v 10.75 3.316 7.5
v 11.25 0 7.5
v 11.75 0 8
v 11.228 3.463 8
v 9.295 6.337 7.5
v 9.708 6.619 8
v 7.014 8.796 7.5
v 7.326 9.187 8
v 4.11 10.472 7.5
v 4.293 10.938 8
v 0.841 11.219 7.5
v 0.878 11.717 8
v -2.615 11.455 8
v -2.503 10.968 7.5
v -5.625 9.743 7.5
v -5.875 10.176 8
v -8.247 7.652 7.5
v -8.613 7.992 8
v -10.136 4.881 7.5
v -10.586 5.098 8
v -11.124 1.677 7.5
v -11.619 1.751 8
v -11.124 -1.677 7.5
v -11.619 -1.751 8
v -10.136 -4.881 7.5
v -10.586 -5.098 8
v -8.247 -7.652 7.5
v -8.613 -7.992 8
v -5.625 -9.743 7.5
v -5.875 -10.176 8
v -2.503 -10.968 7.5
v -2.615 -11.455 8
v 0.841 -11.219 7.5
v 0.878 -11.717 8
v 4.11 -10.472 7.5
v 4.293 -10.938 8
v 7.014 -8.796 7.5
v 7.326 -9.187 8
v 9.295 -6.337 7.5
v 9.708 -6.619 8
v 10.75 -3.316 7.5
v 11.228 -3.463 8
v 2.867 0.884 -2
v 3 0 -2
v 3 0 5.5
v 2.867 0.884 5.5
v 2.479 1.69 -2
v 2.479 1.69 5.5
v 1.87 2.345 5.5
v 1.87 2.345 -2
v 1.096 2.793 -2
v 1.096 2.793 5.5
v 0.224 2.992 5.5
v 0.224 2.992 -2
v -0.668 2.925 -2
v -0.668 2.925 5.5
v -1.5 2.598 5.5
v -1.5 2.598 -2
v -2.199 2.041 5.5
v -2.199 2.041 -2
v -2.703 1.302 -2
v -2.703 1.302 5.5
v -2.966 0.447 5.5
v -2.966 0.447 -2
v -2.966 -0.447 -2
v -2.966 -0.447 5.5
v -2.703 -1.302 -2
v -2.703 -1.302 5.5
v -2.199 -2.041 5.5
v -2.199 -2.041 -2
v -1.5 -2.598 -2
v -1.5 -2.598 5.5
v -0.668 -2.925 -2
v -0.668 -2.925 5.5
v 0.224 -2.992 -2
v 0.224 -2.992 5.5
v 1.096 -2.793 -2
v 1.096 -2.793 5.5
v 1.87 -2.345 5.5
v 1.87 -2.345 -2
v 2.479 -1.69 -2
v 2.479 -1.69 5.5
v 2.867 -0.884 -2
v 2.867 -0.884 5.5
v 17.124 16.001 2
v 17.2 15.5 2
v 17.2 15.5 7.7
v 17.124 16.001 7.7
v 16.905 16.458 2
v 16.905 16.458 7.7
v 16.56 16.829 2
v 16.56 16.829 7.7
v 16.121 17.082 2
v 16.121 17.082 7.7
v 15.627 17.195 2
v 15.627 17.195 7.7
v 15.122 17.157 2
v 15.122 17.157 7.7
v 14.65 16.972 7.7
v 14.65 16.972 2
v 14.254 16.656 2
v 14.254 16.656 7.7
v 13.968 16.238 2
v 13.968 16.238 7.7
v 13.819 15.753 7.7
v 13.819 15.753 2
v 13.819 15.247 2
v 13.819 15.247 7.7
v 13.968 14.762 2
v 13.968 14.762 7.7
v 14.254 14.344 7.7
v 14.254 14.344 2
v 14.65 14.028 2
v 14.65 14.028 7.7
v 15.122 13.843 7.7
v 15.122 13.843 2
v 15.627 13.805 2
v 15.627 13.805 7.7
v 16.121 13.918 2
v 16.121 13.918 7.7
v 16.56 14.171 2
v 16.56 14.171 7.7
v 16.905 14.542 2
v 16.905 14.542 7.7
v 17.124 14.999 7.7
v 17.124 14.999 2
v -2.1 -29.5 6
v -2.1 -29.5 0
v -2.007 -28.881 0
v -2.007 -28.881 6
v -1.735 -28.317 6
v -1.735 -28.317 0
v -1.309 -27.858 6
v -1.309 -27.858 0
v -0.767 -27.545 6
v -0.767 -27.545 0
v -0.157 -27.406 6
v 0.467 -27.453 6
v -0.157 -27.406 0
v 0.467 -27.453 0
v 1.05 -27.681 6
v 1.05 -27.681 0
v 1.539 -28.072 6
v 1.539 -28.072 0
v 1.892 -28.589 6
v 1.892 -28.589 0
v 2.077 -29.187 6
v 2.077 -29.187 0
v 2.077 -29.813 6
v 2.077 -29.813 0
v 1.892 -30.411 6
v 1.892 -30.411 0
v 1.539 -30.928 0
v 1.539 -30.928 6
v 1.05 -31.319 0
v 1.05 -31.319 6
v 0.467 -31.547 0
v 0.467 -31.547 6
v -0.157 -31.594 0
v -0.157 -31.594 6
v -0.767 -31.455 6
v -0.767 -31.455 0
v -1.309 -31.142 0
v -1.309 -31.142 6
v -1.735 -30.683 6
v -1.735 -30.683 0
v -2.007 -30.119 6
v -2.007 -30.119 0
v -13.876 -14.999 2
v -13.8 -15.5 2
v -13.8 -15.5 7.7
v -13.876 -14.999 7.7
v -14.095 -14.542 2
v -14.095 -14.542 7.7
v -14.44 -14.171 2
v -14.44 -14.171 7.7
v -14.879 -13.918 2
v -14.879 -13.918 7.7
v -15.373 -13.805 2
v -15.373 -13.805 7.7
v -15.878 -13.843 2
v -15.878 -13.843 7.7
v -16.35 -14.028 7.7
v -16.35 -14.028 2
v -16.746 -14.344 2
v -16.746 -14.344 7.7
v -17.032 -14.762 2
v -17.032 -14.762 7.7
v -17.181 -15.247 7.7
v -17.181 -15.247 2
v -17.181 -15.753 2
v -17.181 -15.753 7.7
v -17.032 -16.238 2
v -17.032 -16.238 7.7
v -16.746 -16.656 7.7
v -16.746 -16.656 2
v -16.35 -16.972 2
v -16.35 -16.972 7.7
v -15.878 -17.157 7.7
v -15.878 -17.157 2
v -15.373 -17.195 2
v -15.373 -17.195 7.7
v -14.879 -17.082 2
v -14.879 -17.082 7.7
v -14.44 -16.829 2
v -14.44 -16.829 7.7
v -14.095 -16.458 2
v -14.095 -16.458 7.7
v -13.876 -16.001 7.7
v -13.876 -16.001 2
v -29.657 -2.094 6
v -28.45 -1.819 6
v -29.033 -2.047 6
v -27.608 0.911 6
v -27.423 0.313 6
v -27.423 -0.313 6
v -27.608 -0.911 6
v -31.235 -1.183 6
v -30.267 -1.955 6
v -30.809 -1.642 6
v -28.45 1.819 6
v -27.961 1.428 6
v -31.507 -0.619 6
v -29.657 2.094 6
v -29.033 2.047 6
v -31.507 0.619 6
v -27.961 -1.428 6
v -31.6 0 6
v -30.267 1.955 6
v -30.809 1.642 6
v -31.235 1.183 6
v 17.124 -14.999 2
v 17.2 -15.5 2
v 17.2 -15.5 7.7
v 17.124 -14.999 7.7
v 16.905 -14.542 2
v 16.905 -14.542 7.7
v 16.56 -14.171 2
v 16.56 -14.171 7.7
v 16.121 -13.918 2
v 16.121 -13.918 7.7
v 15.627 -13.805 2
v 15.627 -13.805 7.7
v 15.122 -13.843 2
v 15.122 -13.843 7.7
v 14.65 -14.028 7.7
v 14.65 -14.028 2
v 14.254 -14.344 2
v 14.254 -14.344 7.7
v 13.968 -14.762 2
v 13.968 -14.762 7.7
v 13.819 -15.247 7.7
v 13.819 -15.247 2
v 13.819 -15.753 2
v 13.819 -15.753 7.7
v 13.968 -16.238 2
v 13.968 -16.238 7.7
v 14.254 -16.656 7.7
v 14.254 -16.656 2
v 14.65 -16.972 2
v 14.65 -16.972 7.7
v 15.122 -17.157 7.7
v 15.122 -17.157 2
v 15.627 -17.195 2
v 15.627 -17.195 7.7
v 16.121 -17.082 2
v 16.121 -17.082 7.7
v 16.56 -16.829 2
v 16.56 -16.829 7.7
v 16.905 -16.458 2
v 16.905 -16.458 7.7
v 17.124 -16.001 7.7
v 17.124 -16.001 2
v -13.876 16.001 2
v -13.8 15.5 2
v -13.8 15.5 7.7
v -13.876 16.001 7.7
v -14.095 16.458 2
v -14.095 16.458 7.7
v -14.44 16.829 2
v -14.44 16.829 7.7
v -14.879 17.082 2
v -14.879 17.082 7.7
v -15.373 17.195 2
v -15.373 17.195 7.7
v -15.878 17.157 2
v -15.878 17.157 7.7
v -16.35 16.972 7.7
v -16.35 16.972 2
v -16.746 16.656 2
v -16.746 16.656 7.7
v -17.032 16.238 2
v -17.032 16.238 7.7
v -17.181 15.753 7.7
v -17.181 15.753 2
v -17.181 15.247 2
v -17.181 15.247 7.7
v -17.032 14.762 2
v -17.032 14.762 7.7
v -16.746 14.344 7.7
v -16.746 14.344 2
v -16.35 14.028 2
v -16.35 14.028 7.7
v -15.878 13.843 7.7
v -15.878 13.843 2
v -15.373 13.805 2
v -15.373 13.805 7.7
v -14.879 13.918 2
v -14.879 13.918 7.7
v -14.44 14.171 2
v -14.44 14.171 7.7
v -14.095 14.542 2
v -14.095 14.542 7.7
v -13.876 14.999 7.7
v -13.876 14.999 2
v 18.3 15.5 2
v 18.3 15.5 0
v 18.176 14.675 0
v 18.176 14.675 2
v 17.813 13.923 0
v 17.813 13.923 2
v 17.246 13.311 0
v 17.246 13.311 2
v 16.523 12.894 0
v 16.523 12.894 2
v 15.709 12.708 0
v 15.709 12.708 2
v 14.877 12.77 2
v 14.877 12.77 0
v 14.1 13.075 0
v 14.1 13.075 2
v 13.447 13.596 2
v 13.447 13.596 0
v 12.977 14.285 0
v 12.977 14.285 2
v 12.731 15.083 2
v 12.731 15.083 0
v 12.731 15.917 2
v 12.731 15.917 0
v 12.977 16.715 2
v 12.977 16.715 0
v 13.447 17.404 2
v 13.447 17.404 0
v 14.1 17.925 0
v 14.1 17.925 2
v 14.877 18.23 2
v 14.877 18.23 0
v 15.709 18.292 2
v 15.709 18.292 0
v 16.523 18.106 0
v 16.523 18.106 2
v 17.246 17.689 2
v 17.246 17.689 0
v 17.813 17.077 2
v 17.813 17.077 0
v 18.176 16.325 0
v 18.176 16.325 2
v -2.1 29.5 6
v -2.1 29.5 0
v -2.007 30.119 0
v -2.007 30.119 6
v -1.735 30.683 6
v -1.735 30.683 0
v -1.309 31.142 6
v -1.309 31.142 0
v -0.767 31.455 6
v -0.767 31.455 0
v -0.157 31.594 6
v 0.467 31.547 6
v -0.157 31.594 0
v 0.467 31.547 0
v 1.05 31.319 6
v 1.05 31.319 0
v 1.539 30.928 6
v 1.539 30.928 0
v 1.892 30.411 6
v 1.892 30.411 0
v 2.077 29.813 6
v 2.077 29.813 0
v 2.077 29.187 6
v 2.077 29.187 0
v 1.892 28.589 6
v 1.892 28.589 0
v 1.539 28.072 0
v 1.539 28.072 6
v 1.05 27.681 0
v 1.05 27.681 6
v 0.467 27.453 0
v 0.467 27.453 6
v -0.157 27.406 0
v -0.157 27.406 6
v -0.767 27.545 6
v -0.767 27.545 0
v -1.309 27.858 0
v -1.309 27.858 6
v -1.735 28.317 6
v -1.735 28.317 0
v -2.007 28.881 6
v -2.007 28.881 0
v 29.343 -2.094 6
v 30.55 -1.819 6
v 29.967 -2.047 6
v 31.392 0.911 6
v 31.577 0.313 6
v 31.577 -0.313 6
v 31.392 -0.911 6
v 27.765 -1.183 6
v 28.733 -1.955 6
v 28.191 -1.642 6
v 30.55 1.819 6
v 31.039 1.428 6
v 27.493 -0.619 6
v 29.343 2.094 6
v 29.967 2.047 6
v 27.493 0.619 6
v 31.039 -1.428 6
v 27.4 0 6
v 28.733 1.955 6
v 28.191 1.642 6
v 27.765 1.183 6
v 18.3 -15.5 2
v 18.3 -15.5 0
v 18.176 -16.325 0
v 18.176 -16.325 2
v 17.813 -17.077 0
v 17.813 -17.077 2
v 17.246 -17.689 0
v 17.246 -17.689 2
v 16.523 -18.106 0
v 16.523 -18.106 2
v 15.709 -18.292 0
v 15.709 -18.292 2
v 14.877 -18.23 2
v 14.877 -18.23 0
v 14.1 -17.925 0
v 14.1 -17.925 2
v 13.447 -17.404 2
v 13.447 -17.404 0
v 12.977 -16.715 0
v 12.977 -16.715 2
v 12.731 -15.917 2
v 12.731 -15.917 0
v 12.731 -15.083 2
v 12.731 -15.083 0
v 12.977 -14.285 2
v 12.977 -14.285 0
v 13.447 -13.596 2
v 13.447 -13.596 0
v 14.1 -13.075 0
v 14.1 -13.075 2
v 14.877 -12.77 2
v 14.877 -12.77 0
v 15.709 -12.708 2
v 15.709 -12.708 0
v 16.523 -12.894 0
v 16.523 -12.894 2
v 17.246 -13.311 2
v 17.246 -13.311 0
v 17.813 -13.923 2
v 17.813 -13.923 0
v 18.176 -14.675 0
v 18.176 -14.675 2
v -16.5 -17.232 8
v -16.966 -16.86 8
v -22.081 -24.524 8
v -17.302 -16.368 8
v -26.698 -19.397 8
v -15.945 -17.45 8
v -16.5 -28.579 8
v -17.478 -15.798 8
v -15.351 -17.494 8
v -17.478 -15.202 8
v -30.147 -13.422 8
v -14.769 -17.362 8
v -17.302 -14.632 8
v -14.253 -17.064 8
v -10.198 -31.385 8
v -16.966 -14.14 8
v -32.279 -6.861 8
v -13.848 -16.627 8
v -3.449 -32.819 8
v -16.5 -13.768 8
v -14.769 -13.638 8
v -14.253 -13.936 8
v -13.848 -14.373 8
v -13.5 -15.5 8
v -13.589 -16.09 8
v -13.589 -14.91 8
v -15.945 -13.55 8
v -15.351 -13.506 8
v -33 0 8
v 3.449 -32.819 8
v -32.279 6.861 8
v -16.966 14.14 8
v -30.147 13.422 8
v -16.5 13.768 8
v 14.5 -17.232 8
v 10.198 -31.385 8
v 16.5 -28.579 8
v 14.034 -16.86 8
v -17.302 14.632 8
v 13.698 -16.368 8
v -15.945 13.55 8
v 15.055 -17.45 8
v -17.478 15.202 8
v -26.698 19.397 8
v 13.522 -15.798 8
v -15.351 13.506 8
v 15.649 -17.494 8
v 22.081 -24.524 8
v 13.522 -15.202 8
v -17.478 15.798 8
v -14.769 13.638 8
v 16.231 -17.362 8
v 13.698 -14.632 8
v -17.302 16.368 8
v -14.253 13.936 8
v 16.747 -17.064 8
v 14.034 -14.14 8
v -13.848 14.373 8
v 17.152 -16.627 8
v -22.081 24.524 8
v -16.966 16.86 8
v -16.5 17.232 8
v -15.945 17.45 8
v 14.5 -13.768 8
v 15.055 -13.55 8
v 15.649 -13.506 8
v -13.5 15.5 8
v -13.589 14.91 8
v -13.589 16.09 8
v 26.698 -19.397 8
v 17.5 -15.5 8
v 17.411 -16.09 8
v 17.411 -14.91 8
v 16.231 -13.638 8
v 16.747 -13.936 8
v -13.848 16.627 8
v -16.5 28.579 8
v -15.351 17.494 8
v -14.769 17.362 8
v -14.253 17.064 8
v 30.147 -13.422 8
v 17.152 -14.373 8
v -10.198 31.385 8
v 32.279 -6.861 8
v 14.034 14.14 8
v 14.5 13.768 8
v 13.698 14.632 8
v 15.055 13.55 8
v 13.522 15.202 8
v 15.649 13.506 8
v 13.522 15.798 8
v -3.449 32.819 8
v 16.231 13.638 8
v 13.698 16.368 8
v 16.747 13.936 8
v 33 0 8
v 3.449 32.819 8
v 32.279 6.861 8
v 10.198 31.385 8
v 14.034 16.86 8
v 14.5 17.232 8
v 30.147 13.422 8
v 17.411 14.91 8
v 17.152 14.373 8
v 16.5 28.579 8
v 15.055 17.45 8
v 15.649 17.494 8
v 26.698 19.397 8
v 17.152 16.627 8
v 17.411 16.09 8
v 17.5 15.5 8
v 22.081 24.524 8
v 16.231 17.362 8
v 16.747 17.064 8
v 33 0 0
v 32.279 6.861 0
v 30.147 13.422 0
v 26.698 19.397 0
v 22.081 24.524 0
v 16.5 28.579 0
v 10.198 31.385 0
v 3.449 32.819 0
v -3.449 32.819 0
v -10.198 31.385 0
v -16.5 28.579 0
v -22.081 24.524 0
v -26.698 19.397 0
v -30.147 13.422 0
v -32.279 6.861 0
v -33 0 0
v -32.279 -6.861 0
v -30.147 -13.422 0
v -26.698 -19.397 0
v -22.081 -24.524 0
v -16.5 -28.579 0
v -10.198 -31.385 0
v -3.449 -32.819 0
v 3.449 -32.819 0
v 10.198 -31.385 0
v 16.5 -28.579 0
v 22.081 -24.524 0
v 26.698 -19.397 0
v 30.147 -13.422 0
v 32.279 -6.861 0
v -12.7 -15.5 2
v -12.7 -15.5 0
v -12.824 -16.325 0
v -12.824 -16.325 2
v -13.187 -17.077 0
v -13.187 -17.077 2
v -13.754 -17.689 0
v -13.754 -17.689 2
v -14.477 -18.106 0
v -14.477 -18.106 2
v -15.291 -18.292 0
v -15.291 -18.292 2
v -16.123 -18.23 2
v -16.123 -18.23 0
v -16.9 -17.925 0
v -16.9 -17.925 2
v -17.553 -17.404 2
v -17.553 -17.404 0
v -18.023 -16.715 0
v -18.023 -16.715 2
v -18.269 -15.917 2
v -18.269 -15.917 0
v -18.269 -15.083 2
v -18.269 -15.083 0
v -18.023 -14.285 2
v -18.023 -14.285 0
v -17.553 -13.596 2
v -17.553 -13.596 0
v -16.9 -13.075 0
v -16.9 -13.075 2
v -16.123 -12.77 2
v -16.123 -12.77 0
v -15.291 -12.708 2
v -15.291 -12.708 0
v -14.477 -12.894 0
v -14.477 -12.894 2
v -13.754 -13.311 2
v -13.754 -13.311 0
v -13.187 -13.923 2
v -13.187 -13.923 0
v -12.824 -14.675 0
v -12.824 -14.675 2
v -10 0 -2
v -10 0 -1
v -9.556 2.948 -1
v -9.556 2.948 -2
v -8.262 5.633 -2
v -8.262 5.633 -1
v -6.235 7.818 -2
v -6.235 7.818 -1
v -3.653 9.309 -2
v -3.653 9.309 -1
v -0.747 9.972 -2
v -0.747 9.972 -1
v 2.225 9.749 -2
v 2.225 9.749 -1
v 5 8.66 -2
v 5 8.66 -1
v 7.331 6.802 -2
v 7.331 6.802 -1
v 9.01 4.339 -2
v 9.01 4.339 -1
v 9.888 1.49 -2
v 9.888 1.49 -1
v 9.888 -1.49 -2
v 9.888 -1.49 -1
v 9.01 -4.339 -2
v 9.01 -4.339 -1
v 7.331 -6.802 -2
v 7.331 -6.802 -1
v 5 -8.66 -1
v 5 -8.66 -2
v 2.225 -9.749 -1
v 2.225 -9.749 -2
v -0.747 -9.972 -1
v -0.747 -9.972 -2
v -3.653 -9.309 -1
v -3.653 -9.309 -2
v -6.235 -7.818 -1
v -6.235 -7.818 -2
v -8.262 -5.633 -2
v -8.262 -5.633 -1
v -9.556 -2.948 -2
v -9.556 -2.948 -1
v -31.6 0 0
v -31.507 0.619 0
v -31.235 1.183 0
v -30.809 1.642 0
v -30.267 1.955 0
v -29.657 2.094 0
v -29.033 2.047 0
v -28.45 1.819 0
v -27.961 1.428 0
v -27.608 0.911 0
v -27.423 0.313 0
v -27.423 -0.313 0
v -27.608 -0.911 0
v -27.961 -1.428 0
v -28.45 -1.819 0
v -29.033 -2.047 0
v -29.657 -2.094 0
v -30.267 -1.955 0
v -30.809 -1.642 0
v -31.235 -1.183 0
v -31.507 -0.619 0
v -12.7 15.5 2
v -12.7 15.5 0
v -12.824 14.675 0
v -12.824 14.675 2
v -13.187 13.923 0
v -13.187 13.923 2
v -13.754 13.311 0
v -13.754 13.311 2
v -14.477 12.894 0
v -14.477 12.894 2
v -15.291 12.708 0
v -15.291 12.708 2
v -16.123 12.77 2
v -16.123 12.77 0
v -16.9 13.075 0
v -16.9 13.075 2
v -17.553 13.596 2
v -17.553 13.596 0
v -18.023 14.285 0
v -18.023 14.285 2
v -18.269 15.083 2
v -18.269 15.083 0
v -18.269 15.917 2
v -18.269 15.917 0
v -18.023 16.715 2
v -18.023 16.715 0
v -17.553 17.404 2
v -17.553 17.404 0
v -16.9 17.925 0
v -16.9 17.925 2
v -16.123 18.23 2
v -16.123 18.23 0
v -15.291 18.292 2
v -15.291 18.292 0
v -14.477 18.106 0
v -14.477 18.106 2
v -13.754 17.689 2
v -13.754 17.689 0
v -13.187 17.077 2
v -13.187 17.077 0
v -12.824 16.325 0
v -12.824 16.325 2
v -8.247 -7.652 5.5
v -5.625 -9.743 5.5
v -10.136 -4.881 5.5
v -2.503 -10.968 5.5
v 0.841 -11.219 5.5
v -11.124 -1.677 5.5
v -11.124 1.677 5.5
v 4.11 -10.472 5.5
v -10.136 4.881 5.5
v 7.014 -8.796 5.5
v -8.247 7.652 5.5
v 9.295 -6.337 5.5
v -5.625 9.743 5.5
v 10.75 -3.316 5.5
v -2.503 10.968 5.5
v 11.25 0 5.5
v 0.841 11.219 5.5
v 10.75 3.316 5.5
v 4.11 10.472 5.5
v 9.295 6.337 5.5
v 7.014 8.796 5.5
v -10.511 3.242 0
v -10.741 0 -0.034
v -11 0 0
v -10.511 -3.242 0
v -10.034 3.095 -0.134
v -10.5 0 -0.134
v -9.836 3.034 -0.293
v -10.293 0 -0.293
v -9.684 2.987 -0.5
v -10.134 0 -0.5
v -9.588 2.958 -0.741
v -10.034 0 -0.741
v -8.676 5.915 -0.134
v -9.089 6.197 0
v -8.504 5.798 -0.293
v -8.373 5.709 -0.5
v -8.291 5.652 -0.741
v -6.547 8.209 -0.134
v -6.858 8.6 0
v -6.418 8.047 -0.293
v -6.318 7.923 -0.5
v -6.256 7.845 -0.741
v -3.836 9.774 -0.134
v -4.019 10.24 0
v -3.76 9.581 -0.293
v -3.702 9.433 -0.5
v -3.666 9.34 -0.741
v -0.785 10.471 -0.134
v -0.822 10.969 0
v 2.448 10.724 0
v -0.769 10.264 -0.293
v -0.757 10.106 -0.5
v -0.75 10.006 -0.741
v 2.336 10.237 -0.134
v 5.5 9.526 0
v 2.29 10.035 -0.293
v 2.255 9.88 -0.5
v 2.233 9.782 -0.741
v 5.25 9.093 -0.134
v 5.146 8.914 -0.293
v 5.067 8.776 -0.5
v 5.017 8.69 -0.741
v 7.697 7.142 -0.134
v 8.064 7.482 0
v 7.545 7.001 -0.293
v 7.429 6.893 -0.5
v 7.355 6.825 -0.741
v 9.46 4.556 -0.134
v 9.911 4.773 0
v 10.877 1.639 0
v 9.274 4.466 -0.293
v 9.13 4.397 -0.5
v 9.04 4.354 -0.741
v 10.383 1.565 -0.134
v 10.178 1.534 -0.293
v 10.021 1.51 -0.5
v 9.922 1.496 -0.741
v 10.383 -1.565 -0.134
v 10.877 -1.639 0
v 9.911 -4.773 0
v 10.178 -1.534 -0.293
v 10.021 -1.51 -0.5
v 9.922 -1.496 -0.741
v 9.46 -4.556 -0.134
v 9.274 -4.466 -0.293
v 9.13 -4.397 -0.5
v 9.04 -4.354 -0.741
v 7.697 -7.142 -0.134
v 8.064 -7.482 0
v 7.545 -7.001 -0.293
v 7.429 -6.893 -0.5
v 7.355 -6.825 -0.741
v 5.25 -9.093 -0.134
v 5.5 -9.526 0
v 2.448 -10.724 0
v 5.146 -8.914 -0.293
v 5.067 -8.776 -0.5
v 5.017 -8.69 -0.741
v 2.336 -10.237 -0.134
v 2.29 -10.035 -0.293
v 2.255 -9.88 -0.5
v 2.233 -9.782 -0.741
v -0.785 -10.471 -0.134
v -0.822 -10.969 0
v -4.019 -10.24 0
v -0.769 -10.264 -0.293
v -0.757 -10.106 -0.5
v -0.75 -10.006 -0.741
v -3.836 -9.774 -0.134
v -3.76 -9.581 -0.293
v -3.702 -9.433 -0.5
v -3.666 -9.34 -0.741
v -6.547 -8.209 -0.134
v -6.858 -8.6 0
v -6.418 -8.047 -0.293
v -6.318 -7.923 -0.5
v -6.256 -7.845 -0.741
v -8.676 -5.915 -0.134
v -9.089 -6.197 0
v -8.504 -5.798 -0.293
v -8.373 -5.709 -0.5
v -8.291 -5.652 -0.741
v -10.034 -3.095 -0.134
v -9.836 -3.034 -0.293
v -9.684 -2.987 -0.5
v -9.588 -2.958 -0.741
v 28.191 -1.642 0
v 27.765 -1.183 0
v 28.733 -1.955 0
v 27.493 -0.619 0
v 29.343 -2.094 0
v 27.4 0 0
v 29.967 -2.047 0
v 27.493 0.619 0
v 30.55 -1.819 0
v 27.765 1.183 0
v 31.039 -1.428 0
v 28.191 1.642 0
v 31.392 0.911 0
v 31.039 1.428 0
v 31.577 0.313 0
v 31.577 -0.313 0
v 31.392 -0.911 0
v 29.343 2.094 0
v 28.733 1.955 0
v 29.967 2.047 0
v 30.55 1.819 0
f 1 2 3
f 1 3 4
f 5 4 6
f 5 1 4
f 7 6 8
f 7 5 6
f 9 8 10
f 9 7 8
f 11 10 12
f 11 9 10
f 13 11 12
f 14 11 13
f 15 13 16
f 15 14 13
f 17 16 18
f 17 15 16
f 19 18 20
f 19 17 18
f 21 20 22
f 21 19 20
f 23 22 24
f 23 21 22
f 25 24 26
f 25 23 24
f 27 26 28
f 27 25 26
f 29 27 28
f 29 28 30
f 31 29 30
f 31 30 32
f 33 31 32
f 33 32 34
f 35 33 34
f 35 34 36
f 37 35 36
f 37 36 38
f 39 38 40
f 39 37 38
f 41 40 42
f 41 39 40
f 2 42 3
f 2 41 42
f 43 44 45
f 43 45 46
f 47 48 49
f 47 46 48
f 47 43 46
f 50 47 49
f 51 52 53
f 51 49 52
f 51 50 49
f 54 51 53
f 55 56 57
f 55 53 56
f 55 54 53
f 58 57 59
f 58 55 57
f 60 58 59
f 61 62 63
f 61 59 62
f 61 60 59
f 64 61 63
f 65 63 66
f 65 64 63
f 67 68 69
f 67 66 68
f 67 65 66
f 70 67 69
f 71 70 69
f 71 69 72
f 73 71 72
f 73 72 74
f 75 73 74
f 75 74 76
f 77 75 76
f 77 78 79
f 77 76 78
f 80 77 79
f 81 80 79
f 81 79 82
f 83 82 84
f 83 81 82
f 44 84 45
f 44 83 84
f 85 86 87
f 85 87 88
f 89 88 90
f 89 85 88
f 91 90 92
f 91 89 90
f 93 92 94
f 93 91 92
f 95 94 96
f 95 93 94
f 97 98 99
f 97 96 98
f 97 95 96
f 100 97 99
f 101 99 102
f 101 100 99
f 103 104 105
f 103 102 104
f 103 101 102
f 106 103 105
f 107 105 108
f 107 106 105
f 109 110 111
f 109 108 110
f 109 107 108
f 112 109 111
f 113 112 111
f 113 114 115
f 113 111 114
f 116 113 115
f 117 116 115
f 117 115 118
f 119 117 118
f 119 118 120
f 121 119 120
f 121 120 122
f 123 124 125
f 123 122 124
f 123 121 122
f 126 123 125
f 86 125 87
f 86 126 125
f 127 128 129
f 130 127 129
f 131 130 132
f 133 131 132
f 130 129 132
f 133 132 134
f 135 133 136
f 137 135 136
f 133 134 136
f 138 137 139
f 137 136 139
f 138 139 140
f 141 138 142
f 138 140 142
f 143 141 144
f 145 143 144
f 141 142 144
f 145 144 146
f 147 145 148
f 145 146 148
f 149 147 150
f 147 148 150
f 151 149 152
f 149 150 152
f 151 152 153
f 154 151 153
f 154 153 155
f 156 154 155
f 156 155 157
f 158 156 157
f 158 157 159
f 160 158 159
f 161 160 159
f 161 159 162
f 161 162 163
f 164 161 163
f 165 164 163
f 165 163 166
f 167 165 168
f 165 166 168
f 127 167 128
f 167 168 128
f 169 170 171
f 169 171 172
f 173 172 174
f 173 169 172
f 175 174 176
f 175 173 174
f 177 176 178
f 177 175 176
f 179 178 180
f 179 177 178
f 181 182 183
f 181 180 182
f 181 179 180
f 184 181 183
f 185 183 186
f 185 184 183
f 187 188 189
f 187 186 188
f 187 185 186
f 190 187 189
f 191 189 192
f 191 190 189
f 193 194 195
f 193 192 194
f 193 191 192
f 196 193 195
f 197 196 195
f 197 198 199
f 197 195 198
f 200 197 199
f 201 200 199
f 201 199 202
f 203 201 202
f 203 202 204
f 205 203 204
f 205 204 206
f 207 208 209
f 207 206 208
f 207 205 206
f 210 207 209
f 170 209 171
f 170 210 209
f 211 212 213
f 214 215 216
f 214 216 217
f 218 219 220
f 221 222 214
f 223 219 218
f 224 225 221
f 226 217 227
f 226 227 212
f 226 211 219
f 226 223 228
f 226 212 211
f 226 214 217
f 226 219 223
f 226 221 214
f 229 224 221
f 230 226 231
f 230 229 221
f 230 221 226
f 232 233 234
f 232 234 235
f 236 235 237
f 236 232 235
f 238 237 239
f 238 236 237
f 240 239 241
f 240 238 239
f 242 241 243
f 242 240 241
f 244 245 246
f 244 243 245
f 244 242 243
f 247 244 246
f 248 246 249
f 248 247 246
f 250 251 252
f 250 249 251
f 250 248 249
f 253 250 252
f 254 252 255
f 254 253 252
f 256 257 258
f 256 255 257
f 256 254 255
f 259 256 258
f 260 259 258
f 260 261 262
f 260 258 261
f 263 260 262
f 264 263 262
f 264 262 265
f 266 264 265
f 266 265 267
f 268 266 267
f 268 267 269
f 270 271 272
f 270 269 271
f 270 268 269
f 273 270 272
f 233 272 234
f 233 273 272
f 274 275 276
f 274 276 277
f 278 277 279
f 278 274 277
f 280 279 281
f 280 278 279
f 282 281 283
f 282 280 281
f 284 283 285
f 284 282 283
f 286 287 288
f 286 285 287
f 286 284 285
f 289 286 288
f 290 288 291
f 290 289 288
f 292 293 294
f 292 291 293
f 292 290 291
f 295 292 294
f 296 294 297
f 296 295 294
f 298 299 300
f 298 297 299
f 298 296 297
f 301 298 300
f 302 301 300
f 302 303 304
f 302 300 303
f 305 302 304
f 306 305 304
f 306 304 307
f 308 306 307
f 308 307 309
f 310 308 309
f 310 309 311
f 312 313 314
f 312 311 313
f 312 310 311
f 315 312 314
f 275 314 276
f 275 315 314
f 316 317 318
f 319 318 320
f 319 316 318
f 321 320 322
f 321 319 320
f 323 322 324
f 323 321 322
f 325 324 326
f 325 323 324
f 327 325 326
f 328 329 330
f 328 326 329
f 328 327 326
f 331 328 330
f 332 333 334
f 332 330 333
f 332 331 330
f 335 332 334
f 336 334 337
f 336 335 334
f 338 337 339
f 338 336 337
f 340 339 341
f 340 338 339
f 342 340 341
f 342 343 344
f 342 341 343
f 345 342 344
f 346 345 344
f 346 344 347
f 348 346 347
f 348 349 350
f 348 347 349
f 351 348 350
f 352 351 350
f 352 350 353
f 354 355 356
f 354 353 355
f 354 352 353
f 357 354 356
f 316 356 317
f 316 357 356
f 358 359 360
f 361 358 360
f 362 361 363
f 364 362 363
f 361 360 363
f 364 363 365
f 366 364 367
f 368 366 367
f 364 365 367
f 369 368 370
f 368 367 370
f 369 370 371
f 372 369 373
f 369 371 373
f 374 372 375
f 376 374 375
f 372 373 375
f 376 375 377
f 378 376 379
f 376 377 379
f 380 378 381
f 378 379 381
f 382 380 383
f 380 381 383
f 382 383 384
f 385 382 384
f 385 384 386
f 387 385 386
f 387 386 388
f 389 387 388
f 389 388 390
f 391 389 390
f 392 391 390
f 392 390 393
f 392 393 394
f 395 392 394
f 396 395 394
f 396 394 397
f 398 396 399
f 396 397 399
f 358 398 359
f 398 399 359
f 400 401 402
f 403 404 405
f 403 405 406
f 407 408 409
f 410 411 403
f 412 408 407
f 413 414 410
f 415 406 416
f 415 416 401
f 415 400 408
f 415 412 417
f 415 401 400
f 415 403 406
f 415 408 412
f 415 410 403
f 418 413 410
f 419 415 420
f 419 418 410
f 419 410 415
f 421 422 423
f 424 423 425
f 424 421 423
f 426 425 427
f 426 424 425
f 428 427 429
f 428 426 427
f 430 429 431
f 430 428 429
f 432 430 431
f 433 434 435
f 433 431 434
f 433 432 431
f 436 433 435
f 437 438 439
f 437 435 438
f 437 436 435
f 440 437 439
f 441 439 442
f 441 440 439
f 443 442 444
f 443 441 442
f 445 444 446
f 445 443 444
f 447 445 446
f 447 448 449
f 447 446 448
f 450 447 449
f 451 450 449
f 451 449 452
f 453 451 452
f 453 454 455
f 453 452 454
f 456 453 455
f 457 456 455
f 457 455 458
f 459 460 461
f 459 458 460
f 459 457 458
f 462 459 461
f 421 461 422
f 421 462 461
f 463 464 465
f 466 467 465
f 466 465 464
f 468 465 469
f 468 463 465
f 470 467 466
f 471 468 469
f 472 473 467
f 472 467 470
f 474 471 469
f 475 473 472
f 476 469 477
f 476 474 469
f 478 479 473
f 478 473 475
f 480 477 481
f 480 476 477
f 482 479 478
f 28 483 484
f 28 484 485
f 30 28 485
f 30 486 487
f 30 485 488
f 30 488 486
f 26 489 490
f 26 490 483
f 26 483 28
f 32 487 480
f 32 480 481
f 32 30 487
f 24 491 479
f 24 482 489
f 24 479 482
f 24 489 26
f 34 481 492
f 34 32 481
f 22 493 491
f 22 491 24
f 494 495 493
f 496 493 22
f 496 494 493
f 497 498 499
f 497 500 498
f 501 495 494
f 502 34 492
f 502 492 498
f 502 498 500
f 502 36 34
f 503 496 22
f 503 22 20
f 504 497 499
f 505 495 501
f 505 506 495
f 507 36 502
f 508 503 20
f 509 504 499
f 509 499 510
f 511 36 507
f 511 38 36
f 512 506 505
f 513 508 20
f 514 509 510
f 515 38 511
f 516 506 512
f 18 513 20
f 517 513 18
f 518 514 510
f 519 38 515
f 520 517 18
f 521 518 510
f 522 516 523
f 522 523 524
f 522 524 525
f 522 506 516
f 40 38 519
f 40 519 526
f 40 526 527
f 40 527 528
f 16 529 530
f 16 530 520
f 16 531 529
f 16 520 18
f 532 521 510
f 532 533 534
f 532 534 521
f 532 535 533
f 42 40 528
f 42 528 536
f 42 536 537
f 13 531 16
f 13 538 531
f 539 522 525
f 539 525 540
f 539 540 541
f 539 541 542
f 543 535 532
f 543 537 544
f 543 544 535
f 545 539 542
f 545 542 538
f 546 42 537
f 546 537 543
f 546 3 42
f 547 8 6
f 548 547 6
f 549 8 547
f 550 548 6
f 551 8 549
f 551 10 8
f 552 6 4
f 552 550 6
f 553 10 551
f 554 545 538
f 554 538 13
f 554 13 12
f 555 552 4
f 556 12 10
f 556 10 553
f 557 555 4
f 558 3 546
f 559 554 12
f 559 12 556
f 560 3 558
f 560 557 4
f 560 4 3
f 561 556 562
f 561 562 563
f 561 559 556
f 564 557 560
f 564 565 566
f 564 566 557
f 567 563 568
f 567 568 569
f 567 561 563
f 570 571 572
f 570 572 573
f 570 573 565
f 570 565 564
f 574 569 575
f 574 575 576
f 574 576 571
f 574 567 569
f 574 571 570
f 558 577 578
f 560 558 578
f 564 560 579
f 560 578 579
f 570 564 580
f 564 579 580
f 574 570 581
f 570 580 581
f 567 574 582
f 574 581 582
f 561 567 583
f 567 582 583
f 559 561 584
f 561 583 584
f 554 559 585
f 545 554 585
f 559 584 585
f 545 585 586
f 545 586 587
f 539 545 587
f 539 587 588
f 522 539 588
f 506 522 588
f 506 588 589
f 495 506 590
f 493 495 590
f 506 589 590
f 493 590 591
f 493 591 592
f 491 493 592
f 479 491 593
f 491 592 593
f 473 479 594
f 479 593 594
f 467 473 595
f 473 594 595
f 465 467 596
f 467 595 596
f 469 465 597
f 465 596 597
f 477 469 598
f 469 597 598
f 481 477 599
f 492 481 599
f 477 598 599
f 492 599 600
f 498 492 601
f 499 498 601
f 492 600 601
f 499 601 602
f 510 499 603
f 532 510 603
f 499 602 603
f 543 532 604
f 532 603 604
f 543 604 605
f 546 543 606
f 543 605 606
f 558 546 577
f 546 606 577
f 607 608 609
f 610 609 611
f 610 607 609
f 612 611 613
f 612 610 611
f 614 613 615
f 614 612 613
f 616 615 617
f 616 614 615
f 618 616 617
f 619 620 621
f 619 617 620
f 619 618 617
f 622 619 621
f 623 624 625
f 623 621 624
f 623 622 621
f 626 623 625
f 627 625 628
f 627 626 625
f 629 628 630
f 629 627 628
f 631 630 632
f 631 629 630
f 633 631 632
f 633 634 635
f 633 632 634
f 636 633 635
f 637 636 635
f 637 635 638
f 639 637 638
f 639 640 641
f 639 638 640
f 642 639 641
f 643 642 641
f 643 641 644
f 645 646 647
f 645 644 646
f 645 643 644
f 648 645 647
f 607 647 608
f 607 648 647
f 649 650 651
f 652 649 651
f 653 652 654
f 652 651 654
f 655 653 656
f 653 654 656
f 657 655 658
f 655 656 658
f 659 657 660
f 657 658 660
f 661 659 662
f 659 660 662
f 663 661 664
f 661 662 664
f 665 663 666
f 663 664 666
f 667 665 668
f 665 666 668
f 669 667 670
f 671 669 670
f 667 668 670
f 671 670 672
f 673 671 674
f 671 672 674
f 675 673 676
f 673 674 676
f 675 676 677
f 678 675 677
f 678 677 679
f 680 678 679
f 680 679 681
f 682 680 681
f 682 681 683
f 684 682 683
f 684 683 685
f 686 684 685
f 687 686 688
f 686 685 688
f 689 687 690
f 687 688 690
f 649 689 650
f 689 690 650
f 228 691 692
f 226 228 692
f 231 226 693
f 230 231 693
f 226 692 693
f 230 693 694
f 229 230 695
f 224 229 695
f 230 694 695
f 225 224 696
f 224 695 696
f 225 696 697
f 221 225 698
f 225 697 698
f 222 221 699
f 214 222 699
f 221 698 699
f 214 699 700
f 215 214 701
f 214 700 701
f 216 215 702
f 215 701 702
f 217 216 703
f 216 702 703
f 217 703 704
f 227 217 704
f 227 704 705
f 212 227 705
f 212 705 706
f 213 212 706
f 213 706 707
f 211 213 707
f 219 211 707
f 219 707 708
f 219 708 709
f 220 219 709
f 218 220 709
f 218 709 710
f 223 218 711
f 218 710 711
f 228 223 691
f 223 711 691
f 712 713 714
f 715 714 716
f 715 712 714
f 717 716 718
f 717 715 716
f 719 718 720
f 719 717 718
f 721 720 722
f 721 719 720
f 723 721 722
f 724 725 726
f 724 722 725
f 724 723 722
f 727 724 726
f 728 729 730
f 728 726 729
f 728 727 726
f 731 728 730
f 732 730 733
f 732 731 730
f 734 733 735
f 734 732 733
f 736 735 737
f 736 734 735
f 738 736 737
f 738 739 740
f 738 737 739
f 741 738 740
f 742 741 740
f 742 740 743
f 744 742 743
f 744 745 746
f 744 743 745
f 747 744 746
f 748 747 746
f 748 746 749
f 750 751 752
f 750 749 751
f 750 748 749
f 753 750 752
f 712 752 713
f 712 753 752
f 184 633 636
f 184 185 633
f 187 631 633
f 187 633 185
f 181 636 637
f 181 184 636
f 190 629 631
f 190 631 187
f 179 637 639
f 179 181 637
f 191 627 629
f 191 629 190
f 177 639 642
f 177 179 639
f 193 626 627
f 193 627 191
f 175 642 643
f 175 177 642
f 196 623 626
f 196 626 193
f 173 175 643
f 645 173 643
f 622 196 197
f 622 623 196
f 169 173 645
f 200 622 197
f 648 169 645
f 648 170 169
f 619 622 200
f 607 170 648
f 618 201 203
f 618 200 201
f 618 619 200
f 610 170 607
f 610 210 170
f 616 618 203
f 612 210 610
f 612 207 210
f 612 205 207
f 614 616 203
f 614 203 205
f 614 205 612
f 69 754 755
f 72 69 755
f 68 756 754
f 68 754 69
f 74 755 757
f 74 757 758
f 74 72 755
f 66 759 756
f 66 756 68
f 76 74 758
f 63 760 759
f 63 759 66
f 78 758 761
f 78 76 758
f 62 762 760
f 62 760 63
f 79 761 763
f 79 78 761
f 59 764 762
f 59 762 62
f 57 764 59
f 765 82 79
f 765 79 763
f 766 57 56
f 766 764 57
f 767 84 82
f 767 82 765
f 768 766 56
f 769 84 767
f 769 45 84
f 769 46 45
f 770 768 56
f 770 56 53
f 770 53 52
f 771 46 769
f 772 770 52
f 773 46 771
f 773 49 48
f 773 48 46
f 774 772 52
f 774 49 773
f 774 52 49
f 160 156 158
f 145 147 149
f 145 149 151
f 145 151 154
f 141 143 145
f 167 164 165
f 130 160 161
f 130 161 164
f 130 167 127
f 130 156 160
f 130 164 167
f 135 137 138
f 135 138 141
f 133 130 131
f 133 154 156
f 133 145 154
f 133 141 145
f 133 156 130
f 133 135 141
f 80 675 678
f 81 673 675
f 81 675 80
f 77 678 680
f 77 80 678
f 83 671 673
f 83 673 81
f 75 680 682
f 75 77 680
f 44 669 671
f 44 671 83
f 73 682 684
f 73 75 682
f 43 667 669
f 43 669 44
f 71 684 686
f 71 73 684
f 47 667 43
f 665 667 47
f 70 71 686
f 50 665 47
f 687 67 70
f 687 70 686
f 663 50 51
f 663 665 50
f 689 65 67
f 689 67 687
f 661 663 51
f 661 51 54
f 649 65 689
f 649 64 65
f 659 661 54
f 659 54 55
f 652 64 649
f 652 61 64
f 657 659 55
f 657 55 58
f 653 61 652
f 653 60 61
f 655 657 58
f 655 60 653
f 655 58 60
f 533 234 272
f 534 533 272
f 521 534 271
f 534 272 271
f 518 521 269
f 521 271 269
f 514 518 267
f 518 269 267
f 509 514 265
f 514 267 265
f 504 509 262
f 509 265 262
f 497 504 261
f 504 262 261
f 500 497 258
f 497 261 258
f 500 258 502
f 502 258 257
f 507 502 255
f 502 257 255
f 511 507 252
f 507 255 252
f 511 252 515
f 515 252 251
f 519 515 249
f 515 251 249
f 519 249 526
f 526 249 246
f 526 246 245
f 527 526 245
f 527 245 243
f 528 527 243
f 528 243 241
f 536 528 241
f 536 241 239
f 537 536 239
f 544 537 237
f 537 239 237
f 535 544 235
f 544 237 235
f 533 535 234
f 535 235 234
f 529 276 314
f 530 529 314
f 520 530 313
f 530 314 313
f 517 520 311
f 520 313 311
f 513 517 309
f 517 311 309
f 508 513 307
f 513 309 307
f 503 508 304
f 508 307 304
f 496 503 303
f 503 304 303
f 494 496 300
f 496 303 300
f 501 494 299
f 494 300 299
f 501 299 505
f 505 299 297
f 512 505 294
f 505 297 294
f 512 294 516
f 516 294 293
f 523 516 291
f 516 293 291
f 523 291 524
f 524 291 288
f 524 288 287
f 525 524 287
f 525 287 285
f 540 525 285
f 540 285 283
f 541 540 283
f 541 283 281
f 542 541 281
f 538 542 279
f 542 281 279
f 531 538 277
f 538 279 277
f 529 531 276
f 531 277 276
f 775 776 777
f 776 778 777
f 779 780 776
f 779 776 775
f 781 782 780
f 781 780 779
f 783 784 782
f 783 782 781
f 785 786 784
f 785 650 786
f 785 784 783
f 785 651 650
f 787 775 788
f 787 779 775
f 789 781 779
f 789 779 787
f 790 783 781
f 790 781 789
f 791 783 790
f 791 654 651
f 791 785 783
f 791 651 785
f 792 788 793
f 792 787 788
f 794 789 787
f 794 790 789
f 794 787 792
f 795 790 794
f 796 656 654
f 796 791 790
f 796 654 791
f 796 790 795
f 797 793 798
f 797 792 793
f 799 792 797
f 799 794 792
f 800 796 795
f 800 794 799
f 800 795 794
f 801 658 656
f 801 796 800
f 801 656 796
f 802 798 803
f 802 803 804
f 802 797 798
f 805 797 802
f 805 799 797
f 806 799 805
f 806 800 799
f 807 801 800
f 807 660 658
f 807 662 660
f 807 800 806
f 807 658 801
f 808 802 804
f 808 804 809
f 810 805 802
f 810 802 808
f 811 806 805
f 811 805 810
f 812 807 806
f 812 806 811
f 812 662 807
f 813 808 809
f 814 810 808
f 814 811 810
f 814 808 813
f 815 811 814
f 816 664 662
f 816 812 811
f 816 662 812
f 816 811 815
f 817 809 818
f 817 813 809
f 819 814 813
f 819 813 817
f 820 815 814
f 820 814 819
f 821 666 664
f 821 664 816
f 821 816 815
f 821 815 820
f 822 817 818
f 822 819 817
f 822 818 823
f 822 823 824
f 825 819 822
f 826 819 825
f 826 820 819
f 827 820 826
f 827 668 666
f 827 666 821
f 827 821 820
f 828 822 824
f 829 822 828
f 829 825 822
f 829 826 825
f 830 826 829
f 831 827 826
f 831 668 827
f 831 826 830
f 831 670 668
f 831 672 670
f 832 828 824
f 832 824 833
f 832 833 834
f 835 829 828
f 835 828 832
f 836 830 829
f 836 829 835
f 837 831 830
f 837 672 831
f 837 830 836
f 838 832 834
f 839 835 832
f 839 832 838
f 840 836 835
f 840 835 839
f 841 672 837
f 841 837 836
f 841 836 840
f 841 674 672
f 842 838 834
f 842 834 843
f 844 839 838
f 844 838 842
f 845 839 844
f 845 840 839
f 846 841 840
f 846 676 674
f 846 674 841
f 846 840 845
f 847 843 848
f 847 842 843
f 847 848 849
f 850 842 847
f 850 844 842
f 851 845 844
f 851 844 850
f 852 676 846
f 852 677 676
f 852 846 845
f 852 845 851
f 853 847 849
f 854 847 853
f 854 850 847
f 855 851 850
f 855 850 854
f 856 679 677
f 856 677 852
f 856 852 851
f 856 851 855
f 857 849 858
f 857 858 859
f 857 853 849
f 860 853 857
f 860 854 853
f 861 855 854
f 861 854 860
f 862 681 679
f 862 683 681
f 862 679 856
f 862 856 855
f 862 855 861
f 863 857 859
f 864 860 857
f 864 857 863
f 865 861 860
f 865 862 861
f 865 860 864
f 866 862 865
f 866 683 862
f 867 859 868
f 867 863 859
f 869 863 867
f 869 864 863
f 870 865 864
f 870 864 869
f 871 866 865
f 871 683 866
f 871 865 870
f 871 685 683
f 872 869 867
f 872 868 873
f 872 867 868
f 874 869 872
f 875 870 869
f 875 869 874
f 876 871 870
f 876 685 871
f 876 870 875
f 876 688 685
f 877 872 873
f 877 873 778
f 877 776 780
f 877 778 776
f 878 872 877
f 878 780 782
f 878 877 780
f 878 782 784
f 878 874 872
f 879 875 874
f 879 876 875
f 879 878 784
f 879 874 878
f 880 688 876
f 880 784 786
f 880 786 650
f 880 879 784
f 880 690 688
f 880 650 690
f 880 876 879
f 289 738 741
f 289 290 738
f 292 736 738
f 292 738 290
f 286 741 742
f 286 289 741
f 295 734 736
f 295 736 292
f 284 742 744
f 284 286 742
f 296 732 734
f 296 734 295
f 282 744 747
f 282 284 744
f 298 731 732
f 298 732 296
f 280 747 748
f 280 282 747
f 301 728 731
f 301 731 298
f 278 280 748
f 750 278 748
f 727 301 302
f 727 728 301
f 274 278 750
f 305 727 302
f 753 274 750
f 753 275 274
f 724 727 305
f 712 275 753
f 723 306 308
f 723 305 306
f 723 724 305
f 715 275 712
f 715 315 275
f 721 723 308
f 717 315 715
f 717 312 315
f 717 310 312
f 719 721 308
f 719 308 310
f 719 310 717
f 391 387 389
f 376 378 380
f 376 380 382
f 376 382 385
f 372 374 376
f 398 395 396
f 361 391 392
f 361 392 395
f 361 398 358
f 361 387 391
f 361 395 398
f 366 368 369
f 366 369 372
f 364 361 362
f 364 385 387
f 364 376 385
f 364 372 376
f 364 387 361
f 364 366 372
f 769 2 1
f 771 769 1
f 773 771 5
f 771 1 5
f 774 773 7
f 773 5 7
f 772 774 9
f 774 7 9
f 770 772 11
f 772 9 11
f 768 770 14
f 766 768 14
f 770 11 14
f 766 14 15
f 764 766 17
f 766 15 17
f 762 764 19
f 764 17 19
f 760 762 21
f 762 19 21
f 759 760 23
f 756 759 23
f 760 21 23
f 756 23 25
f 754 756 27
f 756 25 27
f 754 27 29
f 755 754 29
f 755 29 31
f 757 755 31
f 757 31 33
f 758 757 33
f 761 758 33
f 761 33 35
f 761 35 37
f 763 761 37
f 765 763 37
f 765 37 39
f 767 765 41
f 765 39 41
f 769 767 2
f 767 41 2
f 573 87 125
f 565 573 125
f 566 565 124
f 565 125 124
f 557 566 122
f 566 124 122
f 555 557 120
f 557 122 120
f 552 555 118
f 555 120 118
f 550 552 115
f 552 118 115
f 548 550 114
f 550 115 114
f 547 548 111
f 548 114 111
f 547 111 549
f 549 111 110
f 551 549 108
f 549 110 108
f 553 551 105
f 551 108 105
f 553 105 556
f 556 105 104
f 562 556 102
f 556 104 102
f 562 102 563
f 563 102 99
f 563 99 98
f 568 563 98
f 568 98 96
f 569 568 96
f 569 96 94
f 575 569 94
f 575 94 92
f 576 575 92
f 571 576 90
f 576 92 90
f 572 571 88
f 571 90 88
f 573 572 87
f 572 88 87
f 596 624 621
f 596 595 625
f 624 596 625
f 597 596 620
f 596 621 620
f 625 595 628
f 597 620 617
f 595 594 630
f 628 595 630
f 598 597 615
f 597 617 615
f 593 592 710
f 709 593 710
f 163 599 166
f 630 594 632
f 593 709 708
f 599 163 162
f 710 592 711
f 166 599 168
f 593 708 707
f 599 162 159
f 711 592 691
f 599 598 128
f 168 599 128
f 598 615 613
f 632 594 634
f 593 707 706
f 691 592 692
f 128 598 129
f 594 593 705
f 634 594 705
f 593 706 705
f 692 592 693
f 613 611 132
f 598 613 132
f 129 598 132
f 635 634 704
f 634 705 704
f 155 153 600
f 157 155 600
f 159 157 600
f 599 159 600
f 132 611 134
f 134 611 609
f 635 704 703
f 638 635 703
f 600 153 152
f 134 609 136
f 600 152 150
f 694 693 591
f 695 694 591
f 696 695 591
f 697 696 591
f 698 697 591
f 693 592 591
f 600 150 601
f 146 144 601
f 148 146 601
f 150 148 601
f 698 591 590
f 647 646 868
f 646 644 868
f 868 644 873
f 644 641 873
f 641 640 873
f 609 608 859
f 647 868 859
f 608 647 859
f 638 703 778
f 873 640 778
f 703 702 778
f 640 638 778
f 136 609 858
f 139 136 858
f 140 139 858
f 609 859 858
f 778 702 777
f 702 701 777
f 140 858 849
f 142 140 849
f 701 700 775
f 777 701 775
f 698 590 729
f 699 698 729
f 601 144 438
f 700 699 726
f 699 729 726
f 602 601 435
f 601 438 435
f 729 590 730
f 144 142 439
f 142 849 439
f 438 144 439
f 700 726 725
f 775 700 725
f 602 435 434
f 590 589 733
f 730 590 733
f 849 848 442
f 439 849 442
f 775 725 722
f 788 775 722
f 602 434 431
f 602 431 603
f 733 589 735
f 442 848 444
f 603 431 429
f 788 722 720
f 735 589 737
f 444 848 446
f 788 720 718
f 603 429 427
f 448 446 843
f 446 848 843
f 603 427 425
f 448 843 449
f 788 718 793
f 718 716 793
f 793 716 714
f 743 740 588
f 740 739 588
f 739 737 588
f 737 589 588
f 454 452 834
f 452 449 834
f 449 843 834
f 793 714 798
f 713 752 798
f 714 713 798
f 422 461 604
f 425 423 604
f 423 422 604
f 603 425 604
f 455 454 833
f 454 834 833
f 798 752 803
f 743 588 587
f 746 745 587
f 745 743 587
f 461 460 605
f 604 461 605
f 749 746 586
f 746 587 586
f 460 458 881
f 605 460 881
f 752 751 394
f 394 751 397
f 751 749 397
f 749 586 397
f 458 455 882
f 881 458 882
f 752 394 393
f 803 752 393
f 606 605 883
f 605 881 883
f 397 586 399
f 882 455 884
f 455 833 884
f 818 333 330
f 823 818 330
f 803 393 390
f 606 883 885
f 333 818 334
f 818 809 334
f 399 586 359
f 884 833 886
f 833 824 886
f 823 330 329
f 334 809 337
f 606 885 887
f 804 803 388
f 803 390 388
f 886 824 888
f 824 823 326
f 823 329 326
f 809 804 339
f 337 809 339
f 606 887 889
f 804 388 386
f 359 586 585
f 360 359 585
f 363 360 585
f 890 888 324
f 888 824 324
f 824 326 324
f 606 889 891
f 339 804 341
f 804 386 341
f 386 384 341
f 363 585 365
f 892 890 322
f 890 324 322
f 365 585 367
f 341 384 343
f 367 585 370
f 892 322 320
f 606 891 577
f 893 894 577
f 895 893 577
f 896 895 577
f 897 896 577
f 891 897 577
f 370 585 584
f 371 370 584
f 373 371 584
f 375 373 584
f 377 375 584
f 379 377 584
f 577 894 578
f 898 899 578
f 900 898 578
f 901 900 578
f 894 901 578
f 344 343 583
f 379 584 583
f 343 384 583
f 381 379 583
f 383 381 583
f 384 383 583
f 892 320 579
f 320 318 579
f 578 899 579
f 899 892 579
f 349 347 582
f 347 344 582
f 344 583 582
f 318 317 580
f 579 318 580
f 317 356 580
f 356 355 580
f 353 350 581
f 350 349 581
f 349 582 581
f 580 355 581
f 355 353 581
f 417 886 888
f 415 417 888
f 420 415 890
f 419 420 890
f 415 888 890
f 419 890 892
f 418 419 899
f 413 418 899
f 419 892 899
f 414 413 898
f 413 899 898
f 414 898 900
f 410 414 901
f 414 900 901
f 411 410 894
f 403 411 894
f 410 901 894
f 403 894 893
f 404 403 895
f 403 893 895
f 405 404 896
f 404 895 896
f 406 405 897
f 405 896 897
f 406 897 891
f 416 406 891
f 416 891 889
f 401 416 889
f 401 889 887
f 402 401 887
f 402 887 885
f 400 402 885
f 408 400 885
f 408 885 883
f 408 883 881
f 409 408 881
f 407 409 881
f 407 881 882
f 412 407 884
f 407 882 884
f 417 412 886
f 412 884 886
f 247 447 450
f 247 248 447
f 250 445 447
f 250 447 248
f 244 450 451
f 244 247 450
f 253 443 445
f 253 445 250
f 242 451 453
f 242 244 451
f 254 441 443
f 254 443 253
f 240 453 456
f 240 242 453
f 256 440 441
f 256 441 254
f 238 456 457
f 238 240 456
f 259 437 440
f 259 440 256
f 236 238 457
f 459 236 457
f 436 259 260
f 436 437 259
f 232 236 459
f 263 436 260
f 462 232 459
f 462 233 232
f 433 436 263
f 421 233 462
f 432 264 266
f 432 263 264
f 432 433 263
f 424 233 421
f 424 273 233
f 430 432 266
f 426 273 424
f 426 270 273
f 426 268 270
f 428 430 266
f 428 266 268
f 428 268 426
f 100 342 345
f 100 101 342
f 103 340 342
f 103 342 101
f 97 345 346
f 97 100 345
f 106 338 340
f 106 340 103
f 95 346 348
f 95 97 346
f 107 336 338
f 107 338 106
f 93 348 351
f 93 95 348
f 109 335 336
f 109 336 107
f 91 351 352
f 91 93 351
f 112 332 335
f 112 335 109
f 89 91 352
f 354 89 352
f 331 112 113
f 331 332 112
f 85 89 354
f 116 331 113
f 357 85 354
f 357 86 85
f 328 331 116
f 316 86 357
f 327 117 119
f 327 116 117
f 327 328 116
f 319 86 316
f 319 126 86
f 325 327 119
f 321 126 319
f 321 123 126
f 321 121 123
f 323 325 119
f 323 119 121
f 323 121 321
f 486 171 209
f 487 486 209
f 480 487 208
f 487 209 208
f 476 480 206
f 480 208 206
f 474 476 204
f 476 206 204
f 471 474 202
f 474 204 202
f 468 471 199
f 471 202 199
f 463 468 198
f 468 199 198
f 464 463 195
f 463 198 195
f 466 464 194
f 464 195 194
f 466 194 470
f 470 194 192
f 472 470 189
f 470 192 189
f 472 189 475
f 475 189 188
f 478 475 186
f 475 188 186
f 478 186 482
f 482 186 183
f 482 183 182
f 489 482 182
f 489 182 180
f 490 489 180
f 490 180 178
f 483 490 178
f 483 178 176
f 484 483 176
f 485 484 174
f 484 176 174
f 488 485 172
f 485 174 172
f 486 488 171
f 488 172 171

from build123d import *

# Parameters (mm, degrees)
SKETCH2_R               = 33
BOSS_EXTRUDE1_DEPTH     = 8
SKETCH6_R               = 10
BOSS_EXTRUDE2_DEPTH     = 2
CUT_EXTRUDE1_DEPTH      = 48.728398255
CUT_EXTRUDE1_DEPTH_BACK = 48.728398255
SKETCH3_R               = 1.7
SKETCH3_R_2             = 3
CUT_EXTRUDE2_DEPTH      = 48.349762407
CUT_EXTRUDE2_DEPTH_BACK = 2
SKETCH4_R               = 2.8
SKETCH5_R               = 2.1
CUT_EXTRUDE3_DEPTH      = 6
FILLET1_R               = 1
SKETCH7_R               = 11.25
CUT_EXTRUDE4_DEPTH      = 2.5
CHAMFER1_SIZE           = 0.5
CHAMFER2_SIZE           = 0.3


with BuildPart() as part:
    # Sketch2 → Boss-Extrude1 (new body)
    with BuildSketch(Plane.XY):
        Circle(SKETCH2_R)
    extrude(amount=BOSS_EXTRUDE1_DEPTH)

    # Sketch6 → Boss-Extrude2 (add)
    with BuildSketch(Plane(origin=(0, 0, 0), x_dir=(-1, 0, 0), z_dir=(0, 0, -1))):
        Circle(SKETCH6_R)
    extrude(amount=BOSS_EXTRUDE2_DEPTH)

    # Sketch3 → Cut-Extrude1 (cut, two sides: drawn at the far end of the back side and taken through both)
    with BuildSketch(Plane.XY.offset(8).offset(-CUT_EXTRUDE1_DEPTH_BACK)):
        with Locations((-15.5, 15.5)):
            Circle(SKETCH3_R)
        with Locations((15.5, 15.5)):
            Circle(SKETCH3_R)
        with Locations((15.5, -15.5)):
            Circle(SKETCH3_R)
        with Locations((-15.5, -15.5)):
            Circle(SKETCH3_R)
        Circle(SKETCH3_R_2)
    extrude(amount=CUT_EXTRUDE1_DEPTH + CUT_EXTRUDE1_DEPTH_BACK, mode=Mode.SUBTRACT)

    # Sketch4 → Cut-Extrude2 (cut, two sides: drawn at the far end of the back side and taken through both)
    with BuildSketch(Plane(origin=(0, 0, 0), x_dir=(-1, 0, 0), z_dir=(0, 0, -1)).offset(-CUT_EXTRUDE2_DEPTH_BACK)):
        with Locations(Location((-15.5, 15.5, 0), (0, 0, 180))):
            Circle(SKETCH4_R)
        with Locations(Location((15.5, 15.5, 0), (0, 0, 180))):
            Circle(SKETCH4_R)
        with Locations(Location((15.5, -15.5, 0), (0, 0, 180))):
            Circle(SKETCH4_R)
        with Locations(Location((-15.5, -15.5, 0), (0, 0, 180))):
            Circle(SKETCH4_R)
    extrude(amount=CUT_EXTRUDE2_DEPTH + CUT_EXTRUDE2_DEPTH_BACK, mode=Mode.SUBTRACT)

    # Sketch5 → Cut-Extrude3 (cut)
    with BuildSketch(Plane(origin=(0, 0, 0), x_dir=(-1, 0, 0), z_dir=(0, 0, -1))):
        with Locations((0, 29.5)):
            Circle(SKETCH5_R)
        with Locations((29.5, 0)):
            Circle(SKETCH5_R)
        with Locations((0, -29.5)):
            Circle(SKETCH5_R)
        with Locations((-29.5, 0)):
            Circle(SKETCH5_R)
    extrude(amount=-CUT_EXTRUDE3_DEPTH, mode=Mode.SUBTRACT)

    # Fillet1
    fillet1_edges = [part.edges().sort_by_distance(p)[0] for p in [
        (10, 0, 0),
    ]]
    fillet(fillet1_edges, radius=FILLET1_R)

    # Sketch7 → Cut-Extrude4 (cut)
    with BuildSketch(Plane.XY.offset(8)):
        Circle(SKETCH7_R)
    extrude(amount=-CUT_EXTRUDE4_DEPTH, mode=Mode.SUBTRACT)

    # Chamfer1
    chamfer1_edges = [part.edges().sort_by_distance(p)[0] for p in [
        (-11.25, 0, 8),
    ]]
    chamfer(chamfer1_edges, length=CHAMFER1_SIZE)

    # Chamfer2
    chamfer2_edges = [part.edges().sort_by_distance(p)[0] for p in [
        (-17.2, -15.5, 8),
        (13.8, -15.5, 8),
        (13.8, 15.5, 8),
        (-17.2, 15.5, 8),
    ]]
    chamfer(chamfer2_edges, length=CHAMFER2_SIZE)


solid = part.part
